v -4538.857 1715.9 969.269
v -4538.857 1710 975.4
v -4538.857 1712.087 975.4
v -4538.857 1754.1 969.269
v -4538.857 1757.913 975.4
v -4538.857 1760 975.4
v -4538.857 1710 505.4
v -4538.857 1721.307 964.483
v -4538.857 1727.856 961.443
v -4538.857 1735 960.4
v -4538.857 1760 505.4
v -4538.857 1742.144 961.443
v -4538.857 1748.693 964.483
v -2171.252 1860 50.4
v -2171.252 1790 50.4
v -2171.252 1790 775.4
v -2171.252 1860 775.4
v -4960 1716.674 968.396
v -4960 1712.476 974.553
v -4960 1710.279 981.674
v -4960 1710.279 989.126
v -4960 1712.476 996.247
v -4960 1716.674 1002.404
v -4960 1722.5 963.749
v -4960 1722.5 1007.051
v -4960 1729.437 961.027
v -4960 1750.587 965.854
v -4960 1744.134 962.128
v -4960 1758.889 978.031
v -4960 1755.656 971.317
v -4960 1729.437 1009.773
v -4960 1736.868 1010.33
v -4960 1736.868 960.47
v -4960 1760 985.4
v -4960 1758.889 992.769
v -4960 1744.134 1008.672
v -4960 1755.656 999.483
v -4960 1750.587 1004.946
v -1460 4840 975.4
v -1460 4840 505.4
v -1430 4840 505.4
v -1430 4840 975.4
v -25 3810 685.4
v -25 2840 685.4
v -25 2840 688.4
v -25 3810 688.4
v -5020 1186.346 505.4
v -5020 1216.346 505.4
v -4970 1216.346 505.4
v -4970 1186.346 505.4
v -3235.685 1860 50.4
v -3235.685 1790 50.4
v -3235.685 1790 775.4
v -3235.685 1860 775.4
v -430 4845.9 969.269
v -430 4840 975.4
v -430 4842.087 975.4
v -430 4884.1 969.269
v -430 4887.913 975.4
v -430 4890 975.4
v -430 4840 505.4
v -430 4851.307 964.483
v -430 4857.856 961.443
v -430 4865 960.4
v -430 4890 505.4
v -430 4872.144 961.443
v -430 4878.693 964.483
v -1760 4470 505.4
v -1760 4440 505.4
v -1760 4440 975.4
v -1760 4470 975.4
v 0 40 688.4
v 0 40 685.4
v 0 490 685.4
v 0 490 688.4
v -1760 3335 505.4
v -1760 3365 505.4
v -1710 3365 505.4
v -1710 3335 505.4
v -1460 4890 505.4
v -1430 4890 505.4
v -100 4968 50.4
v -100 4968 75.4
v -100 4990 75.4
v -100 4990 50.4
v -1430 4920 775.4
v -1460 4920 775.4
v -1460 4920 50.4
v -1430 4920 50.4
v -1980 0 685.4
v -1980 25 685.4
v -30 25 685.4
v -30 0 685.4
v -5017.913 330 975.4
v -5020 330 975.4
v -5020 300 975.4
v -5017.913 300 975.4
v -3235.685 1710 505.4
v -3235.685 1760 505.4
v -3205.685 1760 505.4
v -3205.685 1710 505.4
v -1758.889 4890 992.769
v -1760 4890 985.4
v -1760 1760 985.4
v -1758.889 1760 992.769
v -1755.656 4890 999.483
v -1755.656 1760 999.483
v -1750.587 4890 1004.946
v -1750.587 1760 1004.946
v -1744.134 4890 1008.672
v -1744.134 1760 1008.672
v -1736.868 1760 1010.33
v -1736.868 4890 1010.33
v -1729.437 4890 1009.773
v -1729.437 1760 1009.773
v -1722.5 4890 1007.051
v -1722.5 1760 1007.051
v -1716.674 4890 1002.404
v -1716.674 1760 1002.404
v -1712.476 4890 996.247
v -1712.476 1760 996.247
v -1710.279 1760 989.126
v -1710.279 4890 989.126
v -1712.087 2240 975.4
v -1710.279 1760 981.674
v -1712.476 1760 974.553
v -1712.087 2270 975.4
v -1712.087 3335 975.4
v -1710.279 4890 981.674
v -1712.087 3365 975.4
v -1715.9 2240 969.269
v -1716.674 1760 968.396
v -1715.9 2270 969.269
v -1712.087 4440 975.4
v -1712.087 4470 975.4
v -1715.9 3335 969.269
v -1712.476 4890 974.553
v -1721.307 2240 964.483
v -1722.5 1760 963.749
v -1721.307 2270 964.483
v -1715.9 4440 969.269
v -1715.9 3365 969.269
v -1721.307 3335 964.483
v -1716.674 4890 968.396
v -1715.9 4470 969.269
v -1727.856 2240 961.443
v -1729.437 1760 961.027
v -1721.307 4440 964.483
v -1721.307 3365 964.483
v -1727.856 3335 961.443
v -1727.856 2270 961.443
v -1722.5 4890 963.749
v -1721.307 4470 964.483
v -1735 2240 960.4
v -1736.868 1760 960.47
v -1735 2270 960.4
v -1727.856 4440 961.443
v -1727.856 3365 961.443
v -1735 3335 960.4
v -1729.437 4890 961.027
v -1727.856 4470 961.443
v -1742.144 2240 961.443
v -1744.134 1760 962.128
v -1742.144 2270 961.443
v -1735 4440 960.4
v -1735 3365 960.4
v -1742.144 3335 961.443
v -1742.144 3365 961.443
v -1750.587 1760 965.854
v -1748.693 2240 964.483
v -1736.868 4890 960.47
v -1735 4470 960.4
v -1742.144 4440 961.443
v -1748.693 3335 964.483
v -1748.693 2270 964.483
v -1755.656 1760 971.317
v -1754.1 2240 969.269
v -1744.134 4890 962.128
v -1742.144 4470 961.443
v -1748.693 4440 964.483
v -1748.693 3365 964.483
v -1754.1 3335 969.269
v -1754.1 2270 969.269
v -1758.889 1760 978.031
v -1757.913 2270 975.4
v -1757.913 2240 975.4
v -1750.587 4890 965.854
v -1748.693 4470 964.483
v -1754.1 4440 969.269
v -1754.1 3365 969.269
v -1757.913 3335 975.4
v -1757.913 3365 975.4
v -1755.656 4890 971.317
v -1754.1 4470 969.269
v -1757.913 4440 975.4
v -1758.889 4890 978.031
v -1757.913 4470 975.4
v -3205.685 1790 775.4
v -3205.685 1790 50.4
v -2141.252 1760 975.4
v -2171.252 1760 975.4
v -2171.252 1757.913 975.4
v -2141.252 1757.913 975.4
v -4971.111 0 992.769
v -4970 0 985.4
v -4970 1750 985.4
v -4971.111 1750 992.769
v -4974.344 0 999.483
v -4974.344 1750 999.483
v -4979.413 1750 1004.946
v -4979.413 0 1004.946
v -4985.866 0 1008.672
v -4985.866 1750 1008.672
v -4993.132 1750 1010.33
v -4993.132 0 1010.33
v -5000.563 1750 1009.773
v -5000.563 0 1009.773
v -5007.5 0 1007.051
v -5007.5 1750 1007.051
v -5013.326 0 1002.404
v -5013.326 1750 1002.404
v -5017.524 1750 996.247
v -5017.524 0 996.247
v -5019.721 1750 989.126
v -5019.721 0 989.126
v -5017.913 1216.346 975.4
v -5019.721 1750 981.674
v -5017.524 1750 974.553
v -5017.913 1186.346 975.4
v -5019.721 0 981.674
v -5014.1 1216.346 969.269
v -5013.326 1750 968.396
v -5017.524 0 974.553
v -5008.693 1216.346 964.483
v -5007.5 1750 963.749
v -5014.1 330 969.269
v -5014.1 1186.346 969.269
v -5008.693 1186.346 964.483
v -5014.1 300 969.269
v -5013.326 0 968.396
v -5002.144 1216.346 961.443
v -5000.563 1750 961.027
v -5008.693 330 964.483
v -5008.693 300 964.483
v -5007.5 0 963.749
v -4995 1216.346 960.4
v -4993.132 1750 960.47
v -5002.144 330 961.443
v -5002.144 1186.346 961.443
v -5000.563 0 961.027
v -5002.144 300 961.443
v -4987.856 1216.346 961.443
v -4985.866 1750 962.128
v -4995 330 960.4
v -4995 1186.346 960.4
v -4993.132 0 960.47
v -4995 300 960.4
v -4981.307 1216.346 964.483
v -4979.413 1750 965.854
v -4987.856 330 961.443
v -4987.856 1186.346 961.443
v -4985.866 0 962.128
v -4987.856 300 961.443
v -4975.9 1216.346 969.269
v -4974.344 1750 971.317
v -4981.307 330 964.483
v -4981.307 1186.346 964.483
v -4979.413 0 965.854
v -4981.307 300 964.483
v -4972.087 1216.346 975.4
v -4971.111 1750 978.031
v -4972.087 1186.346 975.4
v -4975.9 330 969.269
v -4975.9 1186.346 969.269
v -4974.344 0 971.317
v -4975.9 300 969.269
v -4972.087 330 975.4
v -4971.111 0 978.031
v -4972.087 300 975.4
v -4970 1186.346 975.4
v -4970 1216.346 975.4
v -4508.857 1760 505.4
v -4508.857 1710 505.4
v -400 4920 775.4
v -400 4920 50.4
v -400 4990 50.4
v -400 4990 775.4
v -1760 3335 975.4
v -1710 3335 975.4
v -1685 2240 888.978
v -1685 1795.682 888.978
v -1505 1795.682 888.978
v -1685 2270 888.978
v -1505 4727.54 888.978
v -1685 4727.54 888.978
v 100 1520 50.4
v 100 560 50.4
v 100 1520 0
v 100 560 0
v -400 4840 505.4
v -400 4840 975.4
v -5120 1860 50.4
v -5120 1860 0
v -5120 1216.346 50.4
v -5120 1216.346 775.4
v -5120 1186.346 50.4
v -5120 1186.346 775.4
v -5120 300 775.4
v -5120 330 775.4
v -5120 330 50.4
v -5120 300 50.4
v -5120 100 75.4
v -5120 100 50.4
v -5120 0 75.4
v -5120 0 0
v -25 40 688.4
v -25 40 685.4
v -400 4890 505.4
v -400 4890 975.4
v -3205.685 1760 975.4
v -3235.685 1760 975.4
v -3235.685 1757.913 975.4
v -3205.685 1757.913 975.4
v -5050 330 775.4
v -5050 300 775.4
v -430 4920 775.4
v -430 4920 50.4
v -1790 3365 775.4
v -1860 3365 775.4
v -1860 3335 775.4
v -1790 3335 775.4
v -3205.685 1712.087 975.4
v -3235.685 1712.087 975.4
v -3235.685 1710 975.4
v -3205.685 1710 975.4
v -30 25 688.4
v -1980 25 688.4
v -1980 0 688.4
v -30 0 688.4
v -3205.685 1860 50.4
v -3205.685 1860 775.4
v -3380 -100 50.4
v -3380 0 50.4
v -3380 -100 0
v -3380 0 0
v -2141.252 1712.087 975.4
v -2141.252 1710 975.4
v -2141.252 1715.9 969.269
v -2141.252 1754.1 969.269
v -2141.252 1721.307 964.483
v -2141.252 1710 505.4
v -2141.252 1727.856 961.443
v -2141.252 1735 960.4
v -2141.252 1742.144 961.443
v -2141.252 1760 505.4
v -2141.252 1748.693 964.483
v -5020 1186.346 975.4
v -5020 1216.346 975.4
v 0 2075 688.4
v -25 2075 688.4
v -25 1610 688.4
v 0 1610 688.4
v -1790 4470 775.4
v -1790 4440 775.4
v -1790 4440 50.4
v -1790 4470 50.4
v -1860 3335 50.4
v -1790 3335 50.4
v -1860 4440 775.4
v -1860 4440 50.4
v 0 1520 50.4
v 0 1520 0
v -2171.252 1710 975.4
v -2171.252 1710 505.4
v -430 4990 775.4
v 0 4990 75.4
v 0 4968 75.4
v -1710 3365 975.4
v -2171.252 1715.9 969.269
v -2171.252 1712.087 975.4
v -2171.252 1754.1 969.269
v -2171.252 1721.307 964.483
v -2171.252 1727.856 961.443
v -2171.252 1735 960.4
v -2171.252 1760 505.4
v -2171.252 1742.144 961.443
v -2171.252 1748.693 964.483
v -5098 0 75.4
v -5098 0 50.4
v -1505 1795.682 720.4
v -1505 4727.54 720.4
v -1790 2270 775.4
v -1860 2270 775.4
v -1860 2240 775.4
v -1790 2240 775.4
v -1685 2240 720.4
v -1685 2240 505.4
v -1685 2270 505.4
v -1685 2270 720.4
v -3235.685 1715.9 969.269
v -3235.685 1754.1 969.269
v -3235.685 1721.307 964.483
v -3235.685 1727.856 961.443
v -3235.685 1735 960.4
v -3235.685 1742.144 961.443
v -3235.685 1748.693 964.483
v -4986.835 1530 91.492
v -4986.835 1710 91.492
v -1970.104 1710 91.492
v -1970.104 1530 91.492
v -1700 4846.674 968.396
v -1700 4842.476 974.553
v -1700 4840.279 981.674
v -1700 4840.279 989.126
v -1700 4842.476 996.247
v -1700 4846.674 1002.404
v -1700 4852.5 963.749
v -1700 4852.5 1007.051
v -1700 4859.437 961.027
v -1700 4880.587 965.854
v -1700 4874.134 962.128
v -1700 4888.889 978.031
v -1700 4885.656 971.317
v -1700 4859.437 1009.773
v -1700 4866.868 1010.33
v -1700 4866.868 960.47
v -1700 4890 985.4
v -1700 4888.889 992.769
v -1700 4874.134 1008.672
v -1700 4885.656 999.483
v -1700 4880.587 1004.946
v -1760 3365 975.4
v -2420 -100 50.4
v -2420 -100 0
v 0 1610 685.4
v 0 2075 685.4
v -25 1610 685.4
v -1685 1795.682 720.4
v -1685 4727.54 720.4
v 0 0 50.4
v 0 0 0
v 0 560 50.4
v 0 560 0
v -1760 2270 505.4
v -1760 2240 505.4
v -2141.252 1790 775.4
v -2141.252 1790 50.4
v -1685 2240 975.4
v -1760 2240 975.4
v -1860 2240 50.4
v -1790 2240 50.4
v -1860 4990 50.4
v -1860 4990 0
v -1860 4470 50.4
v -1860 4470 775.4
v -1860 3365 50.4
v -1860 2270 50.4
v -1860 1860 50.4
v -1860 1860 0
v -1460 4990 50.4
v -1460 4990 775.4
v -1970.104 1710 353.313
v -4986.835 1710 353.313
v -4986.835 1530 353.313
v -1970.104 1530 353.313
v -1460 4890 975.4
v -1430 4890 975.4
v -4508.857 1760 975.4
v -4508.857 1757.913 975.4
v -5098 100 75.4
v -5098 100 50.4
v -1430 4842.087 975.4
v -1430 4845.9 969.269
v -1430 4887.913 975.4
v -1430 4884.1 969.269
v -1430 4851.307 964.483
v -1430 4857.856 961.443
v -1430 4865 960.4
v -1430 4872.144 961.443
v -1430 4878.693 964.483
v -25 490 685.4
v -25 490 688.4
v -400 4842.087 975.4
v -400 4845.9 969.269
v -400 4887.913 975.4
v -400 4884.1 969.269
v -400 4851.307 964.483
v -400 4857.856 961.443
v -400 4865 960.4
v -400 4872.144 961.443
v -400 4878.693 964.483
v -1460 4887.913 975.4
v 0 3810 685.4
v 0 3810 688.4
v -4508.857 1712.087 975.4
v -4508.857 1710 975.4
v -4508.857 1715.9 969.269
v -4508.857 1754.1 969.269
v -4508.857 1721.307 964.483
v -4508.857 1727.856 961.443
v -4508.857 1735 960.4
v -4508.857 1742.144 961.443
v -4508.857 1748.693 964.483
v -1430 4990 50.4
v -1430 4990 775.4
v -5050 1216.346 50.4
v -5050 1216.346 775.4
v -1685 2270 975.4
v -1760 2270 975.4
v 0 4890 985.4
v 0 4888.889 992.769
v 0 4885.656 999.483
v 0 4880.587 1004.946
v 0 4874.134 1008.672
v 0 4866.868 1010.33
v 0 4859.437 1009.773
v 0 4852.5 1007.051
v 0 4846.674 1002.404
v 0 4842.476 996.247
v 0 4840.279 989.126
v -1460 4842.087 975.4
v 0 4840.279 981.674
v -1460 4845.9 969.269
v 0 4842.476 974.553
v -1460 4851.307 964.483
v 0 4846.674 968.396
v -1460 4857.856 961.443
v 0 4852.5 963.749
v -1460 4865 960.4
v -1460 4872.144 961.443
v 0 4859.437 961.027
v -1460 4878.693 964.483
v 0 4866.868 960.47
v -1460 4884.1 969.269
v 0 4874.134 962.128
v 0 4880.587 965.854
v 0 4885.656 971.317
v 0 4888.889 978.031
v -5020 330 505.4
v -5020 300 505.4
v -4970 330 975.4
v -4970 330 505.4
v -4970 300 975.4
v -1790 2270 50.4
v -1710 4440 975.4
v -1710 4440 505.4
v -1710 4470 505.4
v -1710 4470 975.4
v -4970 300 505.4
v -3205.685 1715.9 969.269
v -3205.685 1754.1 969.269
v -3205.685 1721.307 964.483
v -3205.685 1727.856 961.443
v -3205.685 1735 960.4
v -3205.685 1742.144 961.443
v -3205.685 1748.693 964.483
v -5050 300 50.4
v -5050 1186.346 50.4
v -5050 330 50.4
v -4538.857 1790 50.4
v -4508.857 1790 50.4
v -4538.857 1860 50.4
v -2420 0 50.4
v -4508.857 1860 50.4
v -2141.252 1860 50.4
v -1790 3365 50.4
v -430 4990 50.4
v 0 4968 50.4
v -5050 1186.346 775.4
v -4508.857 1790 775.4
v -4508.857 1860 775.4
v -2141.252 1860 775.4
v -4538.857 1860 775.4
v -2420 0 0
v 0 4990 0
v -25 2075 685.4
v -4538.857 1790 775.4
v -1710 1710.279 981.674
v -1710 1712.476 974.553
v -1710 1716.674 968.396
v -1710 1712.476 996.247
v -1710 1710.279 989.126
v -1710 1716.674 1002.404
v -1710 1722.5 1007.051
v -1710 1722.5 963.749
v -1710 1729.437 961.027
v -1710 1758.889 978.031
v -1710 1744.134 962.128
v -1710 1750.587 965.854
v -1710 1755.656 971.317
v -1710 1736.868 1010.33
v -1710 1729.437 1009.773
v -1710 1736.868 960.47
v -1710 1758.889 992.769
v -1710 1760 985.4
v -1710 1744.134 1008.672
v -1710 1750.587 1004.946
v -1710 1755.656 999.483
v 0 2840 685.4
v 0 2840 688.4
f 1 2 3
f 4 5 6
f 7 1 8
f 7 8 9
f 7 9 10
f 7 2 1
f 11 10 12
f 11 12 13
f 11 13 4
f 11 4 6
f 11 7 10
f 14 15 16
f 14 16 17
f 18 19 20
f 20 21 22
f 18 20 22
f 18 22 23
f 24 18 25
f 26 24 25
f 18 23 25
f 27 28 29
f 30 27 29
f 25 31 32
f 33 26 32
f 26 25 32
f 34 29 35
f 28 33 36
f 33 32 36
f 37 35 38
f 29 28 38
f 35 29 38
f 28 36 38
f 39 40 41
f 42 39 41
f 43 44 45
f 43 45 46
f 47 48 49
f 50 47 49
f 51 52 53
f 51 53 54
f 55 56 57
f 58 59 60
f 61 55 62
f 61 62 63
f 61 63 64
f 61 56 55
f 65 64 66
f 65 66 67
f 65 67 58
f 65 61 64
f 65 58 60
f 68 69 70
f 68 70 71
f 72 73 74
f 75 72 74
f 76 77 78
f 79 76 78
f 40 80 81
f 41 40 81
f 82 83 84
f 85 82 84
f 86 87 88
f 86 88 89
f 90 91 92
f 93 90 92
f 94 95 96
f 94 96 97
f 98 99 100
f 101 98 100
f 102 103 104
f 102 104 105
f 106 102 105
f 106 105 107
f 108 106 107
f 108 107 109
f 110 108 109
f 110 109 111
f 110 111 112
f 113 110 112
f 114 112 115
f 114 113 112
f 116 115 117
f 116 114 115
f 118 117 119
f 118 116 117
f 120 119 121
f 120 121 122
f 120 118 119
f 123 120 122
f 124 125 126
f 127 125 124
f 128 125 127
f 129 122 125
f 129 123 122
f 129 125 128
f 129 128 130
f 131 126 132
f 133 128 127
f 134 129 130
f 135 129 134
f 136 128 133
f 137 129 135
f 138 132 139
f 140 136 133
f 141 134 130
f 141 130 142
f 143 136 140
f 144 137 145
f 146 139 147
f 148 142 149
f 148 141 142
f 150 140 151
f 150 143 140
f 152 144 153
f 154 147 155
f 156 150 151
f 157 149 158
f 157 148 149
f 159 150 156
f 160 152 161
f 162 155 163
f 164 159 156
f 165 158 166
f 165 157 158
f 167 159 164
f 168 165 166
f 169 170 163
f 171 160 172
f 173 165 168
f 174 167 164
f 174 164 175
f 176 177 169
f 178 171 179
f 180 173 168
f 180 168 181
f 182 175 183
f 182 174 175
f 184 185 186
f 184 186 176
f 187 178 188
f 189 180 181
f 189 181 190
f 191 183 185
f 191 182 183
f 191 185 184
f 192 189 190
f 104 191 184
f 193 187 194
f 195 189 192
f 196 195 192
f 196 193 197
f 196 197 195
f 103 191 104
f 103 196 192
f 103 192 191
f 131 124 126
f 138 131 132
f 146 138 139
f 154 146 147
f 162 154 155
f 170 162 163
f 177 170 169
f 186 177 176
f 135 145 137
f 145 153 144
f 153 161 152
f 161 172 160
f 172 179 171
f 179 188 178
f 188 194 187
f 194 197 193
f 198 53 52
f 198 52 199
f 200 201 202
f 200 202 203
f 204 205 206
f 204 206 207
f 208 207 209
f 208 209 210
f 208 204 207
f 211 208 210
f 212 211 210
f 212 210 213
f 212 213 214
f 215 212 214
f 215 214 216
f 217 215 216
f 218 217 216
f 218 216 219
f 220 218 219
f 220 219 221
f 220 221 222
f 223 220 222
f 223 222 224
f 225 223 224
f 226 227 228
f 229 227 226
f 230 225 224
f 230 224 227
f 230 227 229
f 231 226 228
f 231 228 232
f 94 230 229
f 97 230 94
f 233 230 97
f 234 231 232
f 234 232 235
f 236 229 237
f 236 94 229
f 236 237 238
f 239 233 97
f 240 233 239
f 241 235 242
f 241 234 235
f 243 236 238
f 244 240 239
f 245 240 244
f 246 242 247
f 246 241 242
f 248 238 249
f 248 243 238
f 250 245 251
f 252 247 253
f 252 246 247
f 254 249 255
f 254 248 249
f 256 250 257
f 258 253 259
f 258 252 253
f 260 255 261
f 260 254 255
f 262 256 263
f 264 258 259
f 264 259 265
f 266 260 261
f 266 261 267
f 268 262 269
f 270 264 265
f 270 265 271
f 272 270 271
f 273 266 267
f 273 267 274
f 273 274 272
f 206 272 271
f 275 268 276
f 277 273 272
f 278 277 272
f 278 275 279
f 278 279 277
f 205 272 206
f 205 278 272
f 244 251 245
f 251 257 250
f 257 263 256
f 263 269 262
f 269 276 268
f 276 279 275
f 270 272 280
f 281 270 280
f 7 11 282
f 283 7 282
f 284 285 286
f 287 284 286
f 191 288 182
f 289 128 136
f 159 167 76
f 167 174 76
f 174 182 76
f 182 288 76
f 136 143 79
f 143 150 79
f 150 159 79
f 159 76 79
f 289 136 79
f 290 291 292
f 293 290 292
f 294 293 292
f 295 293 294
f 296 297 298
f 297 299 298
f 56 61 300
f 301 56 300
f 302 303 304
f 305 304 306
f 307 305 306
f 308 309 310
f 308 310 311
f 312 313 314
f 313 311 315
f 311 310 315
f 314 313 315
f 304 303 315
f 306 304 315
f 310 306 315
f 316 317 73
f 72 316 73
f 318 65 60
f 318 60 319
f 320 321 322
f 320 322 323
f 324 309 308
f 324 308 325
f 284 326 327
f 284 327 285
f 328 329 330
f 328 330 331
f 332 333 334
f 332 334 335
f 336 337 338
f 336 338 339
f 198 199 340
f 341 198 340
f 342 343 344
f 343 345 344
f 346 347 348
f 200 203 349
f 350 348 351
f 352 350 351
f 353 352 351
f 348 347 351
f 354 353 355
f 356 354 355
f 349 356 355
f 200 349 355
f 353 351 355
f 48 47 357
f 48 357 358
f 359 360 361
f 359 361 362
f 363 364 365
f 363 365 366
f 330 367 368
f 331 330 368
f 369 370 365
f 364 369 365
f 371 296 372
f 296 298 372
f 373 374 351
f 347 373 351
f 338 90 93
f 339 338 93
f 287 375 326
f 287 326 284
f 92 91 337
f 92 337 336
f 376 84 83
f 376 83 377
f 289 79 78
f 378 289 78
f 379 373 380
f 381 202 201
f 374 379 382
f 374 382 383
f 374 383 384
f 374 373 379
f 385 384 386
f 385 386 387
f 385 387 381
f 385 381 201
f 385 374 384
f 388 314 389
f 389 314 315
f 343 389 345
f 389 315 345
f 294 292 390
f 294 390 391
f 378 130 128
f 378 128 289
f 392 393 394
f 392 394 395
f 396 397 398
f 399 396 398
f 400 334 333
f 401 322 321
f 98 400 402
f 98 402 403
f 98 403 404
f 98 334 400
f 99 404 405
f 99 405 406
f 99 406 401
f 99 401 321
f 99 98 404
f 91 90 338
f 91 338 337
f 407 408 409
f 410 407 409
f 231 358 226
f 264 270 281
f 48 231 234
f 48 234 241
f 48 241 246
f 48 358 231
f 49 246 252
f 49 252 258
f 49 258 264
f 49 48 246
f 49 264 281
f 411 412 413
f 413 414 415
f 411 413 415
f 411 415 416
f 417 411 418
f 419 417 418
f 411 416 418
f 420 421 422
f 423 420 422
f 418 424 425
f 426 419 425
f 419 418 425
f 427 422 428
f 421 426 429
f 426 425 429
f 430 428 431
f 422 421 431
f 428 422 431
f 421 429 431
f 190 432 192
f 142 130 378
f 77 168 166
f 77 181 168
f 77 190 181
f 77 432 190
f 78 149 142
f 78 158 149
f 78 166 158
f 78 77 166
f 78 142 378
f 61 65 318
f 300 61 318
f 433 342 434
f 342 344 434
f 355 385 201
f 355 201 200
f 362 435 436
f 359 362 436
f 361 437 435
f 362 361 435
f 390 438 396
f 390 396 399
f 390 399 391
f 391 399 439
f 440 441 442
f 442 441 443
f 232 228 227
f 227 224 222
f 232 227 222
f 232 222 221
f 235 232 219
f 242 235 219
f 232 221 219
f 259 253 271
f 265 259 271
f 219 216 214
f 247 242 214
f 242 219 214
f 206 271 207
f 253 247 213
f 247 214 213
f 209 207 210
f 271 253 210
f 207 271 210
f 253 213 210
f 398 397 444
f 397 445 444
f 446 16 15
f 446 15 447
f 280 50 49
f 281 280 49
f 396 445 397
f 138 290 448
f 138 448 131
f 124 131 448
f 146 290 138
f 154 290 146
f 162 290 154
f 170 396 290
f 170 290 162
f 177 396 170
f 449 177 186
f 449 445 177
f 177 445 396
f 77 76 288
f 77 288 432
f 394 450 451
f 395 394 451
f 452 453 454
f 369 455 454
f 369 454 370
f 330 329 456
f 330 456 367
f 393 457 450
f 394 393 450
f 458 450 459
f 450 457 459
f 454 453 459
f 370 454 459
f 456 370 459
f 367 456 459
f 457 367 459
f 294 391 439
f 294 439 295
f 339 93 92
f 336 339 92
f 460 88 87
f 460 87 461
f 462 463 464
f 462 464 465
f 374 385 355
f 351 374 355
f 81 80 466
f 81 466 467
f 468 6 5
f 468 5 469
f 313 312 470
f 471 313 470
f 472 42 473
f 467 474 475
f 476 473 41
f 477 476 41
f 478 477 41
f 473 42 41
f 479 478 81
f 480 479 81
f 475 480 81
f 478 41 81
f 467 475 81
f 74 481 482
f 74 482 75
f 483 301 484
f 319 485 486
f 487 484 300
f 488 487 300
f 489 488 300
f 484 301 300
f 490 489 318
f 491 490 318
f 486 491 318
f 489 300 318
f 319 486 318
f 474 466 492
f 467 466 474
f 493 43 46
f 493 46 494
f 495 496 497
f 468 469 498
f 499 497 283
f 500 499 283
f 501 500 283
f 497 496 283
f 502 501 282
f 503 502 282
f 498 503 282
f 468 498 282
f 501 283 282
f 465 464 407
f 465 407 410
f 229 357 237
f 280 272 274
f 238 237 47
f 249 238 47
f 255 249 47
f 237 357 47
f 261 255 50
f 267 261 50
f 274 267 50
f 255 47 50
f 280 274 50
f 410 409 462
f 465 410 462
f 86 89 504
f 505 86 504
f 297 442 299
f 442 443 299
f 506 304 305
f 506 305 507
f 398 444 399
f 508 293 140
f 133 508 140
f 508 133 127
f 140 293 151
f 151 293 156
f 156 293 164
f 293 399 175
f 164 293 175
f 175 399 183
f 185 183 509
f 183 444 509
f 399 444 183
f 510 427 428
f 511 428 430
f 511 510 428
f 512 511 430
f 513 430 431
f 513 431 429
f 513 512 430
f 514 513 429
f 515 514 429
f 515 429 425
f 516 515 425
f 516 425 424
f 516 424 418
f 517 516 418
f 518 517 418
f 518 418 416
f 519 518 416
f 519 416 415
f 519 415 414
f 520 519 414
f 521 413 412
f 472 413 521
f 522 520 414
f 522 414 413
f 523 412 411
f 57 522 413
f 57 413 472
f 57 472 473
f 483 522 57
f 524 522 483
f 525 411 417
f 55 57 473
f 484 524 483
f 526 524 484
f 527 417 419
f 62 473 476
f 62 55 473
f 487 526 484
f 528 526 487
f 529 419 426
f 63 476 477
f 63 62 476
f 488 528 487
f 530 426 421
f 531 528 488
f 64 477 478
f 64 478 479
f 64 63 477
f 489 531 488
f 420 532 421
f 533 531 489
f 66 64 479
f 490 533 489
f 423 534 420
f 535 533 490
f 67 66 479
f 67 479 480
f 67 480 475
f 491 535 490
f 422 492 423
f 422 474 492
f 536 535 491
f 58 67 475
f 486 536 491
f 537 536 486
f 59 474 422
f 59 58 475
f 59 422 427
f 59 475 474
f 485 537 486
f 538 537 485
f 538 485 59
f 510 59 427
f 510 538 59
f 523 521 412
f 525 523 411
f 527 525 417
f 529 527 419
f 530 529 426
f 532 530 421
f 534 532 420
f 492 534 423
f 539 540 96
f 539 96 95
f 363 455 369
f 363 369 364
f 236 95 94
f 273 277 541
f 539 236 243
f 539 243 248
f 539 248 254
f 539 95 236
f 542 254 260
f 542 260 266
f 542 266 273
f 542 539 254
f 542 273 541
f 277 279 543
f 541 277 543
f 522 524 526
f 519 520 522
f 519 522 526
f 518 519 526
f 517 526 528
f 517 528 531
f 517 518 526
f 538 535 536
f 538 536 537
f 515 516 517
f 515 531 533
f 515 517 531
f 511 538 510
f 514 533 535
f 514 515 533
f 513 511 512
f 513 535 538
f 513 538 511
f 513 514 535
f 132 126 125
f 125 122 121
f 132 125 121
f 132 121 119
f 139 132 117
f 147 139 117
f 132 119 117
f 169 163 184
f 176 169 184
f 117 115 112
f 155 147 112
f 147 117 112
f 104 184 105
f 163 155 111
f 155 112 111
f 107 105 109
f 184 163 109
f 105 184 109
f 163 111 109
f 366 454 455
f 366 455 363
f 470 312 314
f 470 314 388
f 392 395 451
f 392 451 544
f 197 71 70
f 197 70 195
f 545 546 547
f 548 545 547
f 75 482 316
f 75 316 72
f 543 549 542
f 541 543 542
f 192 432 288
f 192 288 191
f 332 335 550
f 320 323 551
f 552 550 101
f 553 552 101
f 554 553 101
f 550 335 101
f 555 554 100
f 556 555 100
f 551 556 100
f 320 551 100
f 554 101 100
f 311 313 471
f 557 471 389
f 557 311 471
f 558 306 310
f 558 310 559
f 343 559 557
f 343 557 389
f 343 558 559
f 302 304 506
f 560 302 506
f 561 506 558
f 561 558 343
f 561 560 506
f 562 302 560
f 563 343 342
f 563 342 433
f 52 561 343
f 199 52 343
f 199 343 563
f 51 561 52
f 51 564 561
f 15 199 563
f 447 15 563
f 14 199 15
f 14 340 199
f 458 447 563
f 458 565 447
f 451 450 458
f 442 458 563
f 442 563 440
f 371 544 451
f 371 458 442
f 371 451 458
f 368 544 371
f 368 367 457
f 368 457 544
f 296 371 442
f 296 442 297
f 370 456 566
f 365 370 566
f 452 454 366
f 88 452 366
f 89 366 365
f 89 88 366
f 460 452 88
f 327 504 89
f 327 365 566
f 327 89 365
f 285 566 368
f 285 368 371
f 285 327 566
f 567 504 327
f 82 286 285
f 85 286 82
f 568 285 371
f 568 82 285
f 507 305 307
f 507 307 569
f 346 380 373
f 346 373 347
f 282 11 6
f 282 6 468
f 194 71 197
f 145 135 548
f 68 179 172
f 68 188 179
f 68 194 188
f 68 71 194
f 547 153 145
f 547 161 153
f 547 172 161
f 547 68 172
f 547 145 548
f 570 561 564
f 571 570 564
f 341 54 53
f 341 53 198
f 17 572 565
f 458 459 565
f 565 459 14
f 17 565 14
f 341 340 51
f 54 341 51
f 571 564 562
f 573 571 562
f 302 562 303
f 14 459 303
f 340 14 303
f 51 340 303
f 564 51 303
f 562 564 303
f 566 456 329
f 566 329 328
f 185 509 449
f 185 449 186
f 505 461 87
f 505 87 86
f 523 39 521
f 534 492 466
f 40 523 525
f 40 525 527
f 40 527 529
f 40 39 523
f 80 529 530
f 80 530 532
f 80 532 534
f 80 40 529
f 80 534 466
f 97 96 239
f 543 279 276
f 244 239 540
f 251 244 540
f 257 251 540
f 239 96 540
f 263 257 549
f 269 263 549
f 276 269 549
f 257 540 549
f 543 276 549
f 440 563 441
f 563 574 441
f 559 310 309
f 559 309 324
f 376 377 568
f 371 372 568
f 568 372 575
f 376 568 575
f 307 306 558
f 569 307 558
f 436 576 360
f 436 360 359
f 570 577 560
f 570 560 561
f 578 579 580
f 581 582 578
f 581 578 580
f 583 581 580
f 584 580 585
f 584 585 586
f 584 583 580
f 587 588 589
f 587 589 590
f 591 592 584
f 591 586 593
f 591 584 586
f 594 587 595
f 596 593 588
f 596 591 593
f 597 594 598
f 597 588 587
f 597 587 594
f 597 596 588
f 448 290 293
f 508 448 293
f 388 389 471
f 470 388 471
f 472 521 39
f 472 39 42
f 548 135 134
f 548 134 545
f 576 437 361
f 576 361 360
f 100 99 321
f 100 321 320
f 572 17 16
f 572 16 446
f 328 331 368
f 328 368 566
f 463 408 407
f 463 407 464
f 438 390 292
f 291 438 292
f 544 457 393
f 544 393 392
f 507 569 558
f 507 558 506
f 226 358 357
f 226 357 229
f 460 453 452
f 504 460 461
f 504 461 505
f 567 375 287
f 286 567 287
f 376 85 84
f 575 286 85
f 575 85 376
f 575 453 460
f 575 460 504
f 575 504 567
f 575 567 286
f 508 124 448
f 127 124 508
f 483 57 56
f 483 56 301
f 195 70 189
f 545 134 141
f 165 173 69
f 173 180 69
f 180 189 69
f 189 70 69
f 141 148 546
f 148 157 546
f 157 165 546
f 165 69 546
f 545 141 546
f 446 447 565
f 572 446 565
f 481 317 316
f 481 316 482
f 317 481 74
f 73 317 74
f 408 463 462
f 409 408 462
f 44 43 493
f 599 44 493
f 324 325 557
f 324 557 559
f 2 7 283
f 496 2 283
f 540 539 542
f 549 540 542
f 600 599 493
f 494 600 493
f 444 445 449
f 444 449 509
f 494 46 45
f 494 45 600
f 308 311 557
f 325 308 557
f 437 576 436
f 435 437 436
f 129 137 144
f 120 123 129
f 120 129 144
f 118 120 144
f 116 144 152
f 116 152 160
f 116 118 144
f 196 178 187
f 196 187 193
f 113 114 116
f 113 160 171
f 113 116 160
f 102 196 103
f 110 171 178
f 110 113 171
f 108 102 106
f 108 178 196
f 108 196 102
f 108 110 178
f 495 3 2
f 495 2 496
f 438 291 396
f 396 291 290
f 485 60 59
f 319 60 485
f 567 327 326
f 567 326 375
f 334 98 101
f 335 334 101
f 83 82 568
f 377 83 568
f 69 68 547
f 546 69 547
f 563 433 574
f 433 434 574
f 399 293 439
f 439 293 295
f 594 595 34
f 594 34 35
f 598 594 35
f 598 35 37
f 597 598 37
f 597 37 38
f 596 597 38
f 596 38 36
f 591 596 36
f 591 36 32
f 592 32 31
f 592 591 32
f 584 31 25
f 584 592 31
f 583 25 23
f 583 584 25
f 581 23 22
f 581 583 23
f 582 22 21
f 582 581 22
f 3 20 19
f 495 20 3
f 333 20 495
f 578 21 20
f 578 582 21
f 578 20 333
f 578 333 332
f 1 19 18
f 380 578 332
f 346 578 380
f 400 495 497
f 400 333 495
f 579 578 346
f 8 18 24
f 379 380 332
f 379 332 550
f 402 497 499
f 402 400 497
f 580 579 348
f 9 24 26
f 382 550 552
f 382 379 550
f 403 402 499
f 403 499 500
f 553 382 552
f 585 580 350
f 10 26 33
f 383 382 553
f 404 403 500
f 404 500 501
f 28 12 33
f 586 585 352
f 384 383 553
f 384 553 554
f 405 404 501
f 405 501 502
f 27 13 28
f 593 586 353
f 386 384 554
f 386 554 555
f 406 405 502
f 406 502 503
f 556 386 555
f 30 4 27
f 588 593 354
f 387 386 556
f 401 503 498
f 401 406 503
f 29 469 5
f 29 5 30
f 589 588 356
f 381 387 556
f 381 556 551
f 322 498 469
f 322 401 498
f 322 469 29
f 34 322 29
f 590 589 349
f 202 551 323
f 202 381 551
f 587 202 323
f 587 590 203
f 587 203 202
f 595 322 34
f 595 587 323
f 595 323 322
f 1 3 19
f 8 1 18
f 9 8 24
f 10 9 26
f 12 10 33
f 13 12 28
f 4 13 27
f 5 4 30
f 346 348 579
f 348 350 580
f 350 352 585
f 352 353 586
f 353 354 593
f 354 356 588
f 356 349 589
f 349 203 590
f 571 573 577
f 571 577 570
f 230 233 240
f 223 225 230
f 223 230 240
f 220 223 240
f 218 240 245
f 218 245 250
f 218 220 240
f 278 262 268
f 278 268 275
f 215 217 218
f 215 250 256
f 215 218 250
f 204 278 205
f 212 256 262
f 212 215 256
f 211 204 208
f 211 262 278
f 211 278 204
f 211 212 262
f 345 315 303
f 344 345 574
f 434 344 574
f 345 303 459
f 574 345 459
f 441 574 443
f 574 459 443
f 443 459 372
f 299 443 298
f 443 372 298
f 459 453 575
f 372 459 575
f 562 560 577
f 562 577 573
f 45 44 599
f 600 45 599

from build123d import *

# Parameters (mm, degrees)
F1_DEPTH  = 25.4
F2_W      = 30
F2_H      = 70
F2_W_2    = 70
F2_H_2    = 30
F3_DEPTH  = 750
F5_W      = 50
F5_H      = 30
F6_DEPTH  = 470
F5_W_2    = 30
F5_H_2    = 50
F7_R      = 25
F8_DEPTH  = 1700
F9_R      = 25
F10_DEPTH = 3130
F11_R     = 25
F12_DEPTH = 3250
F13_R     = 25
F14_DEPTH = 1750
F16_W     = 25
F16_H     = 970
F17_DEPTH = 3
F16_H_2   = 465
F16_W_2   = 1950
F16_H_3   = 25
F16_H_4   = 450
F18_DEPTH = 25
F19_W     = 100
F19_H     = 22
F19_W_2   = 22
F19_H_2   = 100
F20_DEPTH = 25
F21_DEPTH = 25
F22_W     = 2931.857542173
F22_H     = 168.5780864702
F23_DEPTH = 180
F24_W     = 3016.7315006256
F24_H     = 261.820666492
F25_DEPTH = 180


with BuildPart() as f1:
    # F0 (on Top) → F1 (new body)
    with BuildSketch(Plane.XY):
        Polygon((-2420, 0), (0, 0), (0, 560), (100, 560), (100, 1520), (0, 1520), (0, 4990), (-1860, 4990), (-1860, 1860), (-5120, 1860), (-5120, 0), (-3380, 0), (-3380, -100), (-2420, -100), align=None)
    extrude(amount=F1_DEPTH)

    # F2 (on face) → F3 (join)
    with BuildSketch(Plane.XY.offset(25.4)):
        with Locations((-415, 4955)):
            Rectangle(F2_W, F2_H)
        with Locations((-1825, 4455)):
            Rectangle(F2_W_2, F2_H_2)
        with Locations((-1825, 2255)):
            Rectangle(F2_W_2, F2_H_2)
        with Locations((-2156.2518024445, 1825)):
            Rectangle(F2_W, F2_H)
        with Locations((-3220.6851100922, 1825)):
            Rectangle(F2_W, F2_H)
        with Locations((-4523.8569831848, 1825)):
            Rectangle(F2_W, F2_H)
        with Locations((-1445, 4955)):
            Rectangle(F2_W, F2_H)
        with Locations((-5085, 315)):
            Rectangle(F2_W_2, F2_H_2)
        with Locations((-1825, 3350)):
            Rectangle(F2_W_2, F2_H_2)
        with Locations((-5085, 1201.3461732864)):
            Rectangle(F2_W_2, F2_H_2)
    extrude(amount=F3_DEPTH)

    # F2 (on face) → F18 (join)
    with BuildSketch(Plane.XY.offset(25.4)):
        Polygon((-430, 4920), (-430, 4990), (-1430, 4990), (-1430, 4920), (-1460, 4920), (-1460, 4990), (-1860, 4990), (-1860, 4470), (-1790, 4470), (-1790, 4440), (-1860, 4440), (-1860, 3365), (-1790, 3365), (-1790, 3335), (-1860, 3335), (-1860, 2270), (-1790, 2270), (-1790, 2240), (-1860, 2240), (-1860, 1860), (-2141.2518024445, 1860), (-2141.2518024445, 1790), (-2171.2518024445, 1790), (-2171.2518024445, 1860), (-3205.6851100922, 1860), (-3205.6851100922, 1790), (-3235.6851100922, 1790), (-3235.6851100922, 1860), (-4508.8569831848, 1860), (-4508.8569831848, 1790), (-4538.8569831848, 1790), (-4538.8569831848, 1860), (-5120, 1860), (-5120, 1216.3461732864), (-5050, 1216.3461732864), (-5050, 1186.3461732864), (-5120, 1186.3461732864), (-5120, 330), (-5050, 330), (-5050, 300), (-5120, 300), (-5120, 0), (-3380, 0), (-3380, -100), (-2420, -100), (-2420, 0), (0, 0), (0, 560), (100, 560), (100, 1520), (0, 1520), (0, 4990), (-400, 4990), (-400, 4920), align=None)
    extrude(amount=F18_DEPTH)

    # F19 (on face) → F20 (join)
    with BuildSketch(Plane.XY.offset(50.4)):
        with Locations((-50, 4979)):
            Rectangle(F19_W, F19_H)
        with Locations((-5109, 50)):
            Rectangle(F19_W_2, F19_H_2)
    extrude(amount=F20_DEPTH)


with BuildPart() as f6:
    # F5 (on offset) → F6 (new body)
    with BuildSketch(Plane.XY.offset(505.4)):
        with Locations((-1735, 4455)):
            Rectangle(F5_W, F5_H)
    extrude(amount=F6_DEPTH)



with BuildPart() as f6b:
    # F5 (on offset) → F6, piece 2 (new body)
    with BuildSketch(Plane.XY.offset(505.4)):
        with Locations((-1445, 4865)):
            Rectangle(F5_W_2, F5_H_2)
    extrude(amount=F6_DEPTH)



with BuildPart() as f6c:
    # F5 (on offset) → F6, piece 3 (new body)
    with BuildSketch(Plane.XY.offset(505.4)):
        with Locations((-415, 4865)):
            Rectangle(F5_W_2, F5_H_2)
    extrude(amount=F6_DEPTH)


with BuildPart() as f6d:
    # F5 (on offset) → F6, piece 4 (new body)
    with BuildSketch(Plane.XY.offset(505.4)):
        with Locations((-1735, 2255)):
            Rectangle(F5_W, F5_H)
    extrude(amount=F6_DEPTH)


with BuildPart() as f6e:
    # F5 (on offset) → F6, piece 5 (new body)
    with BuildSketch(Plane.XY.offset(505.4)):
        with Locations((-2156.2518024445, 1735)):
            Rectangle(F5_W_2, F5_H_2)
    extrude(amount=F6_DEPTH)



with BuildPart() as f6f:
    # F5 (on offset) → F6, piece 6 (new body)
    with BuildSketch(Plane.XY.offset(505.4)):
        with Locations((-3220.6851100922, 1735)):
            Rectangle(F5_W_2, F5_H_2)
    extrude(amount=F6_DEPTH)


with BuildPart() as f6g:
    # F5 (on offset) → F6, piece 7 (new body)
    with BuildSketch(Plane.XY.offset(505.4)):
        with Locations((-4523.8569831848, 1735)):
            Rectangle(F5_W_2, F5_H_2)
    extrude(amount=F6_DEPTH)


with BuildPart() as f6h:
    # F5 (on offset) → F6, piece 8 (new body)
    with BuildSketch(Plane.XY.offset(505.4)):
        with Locations((-4995, 315)):
            Rectangle(F5_W, F5_H)
    extrude(amount=F6_DEPTH)



with BuildPart() as f6i:
    # F5 (on offset) → F6, piece 9 (new body)
    with BuildSketch(Plane.XY.offset(505.4)):
        with Locations((-4995, 1201.3461732864)):
            Rectangle(F5_W, F5_H)
    extrude(amount=F6_DEPTH)


with BuildPart() as f6j:
    # F5 (on offset) → F6, piece 10 (new body)
    with BuildSketch(Plane.XY.offset(505.4)):
        with Locations((-1735, 3350)):
            Rectangle(F5_W, F5_H)
    extrude(amount=F6_DEPTH)


with BuildPart() as f6b_1:
    add(f6b.part)

    add(f6c.part)  # F8 merges F6c
    # F7 (on face) → F8 (join)
    with BuildSketch(Plane.YZ):
        with Locations((4865, 985.4)):
            Circle(F7_R)
    extrude(amount=-F8_DEPTH)


with BuildPart() as f6_1:
    add(f6.part)

    add(f6d.part)  # F10 merges F6d

    add(f6j.part)  # F10 merges F6j
    # F9 (on face) → F10 (join)
    with BuildSketch(Plane(origin=(0, 4890, 0), x_dir=(-1, 0, 0), z_dir=(0, 1, 0))):
        with Locations((1735, 985.4)):
            Circle(F9_R)
    extrude(amount=-F10_DEPTH)

    # F21 (add): a face of the model
    f21_faces = [f6_1.faces().sort_by_distance(p)[0] for p in [
        (-1710, 2255, 740.4),
    ]]
    extrude(f21_faces, amount=F21_DEPTH)

    # F22 (on face) → F23 (join)
    with BuildSketch(Plane.YZ.offset(-1685)):
        with Locations((3261.6109848022, 804.6890432351)):
            Rectangle(F22_W, F22_H)
    extrude(amount=F23_DEPTH)


with BuildPart() as f6e_1:
    add(f6e.part)

    add(f6f.part)  # F12 merges F6f

    add(f6g.part)  # F12 merges F6g
    # F11 (on face) → F12 (join)
    with BuildSketch(Plane.YZ.offset(-1710)):
        with Locations((1735, 985.4)):
            Circle(F11_R)
    extrude(amount=-F12_DEPTH)


with BuildPart() as f6h_1:
    add(f6h.part)

    add(f6i.part)  # F14 merges F6i
    # F13 (on face) → F14 (join)
    with BuildSketch(Plane.XZ):
        with Locations((-4995, 985.4)):
            Circle(F13_R)
    extrude(amount=-F14_DEPTH)


with BuildPart() as f17:
    # F16 (on offset) → F17 (new body)
    with BuildSketch(Plane.XY.offset(685.4)):
        with Locations((-12.5, 3325)):
            Rectangle(F16_W, F16_H)
    extrude(amount=F17_DEPTH)


with BuildPart() as f17b:
    # F16 (on offset) → F17, piece 2 (new body)
    with BuildSketch(Plane.XY.offset(685.4)):
        with Locations((-12.5, 1842.5)):
            Rectangle(F16_W, F16_H_2)
    extrude(amount=F17_DEPTH)


with BuildPart() as f17c:
    # F16 (on offset) → F17, piece 3 (new body)
    with BuildSketch(Plane.XY.offset(685.4)):
        with Locations((-1005, 12.5)):
            Rectangle(F16_W_2, F16_H_3)
    extrude(amount=F17_DEPTH)


with BuildPart() as f17d:
    # F16 (on offset) → F17, piece 4 (new body)
    with BuildSketch(Plane.XY.offset(685.4)):
        with Locations((-12.5, 265)):
            Rectangle(F16_W, F16_H_4)
    extrude(amount=F17_DEPTH)


with BuildPart() as f25:
    # F24 (on face) → F25 (new body)
    with BuildSketch(Plane.XZ.offset(-1710)):
        with Locations((-3478.4697294235, 222.4028147757)):
            Rectangle(F24_W, F24_H)
    extrude(amount=F25_DEPTH)


solid = Compound([f1.part, f6b_1.part, f6_1.part, f6e_1.part, f6h_1.part, f17.part, f17b.part, f17c.part, f17d.part, f25.part])
